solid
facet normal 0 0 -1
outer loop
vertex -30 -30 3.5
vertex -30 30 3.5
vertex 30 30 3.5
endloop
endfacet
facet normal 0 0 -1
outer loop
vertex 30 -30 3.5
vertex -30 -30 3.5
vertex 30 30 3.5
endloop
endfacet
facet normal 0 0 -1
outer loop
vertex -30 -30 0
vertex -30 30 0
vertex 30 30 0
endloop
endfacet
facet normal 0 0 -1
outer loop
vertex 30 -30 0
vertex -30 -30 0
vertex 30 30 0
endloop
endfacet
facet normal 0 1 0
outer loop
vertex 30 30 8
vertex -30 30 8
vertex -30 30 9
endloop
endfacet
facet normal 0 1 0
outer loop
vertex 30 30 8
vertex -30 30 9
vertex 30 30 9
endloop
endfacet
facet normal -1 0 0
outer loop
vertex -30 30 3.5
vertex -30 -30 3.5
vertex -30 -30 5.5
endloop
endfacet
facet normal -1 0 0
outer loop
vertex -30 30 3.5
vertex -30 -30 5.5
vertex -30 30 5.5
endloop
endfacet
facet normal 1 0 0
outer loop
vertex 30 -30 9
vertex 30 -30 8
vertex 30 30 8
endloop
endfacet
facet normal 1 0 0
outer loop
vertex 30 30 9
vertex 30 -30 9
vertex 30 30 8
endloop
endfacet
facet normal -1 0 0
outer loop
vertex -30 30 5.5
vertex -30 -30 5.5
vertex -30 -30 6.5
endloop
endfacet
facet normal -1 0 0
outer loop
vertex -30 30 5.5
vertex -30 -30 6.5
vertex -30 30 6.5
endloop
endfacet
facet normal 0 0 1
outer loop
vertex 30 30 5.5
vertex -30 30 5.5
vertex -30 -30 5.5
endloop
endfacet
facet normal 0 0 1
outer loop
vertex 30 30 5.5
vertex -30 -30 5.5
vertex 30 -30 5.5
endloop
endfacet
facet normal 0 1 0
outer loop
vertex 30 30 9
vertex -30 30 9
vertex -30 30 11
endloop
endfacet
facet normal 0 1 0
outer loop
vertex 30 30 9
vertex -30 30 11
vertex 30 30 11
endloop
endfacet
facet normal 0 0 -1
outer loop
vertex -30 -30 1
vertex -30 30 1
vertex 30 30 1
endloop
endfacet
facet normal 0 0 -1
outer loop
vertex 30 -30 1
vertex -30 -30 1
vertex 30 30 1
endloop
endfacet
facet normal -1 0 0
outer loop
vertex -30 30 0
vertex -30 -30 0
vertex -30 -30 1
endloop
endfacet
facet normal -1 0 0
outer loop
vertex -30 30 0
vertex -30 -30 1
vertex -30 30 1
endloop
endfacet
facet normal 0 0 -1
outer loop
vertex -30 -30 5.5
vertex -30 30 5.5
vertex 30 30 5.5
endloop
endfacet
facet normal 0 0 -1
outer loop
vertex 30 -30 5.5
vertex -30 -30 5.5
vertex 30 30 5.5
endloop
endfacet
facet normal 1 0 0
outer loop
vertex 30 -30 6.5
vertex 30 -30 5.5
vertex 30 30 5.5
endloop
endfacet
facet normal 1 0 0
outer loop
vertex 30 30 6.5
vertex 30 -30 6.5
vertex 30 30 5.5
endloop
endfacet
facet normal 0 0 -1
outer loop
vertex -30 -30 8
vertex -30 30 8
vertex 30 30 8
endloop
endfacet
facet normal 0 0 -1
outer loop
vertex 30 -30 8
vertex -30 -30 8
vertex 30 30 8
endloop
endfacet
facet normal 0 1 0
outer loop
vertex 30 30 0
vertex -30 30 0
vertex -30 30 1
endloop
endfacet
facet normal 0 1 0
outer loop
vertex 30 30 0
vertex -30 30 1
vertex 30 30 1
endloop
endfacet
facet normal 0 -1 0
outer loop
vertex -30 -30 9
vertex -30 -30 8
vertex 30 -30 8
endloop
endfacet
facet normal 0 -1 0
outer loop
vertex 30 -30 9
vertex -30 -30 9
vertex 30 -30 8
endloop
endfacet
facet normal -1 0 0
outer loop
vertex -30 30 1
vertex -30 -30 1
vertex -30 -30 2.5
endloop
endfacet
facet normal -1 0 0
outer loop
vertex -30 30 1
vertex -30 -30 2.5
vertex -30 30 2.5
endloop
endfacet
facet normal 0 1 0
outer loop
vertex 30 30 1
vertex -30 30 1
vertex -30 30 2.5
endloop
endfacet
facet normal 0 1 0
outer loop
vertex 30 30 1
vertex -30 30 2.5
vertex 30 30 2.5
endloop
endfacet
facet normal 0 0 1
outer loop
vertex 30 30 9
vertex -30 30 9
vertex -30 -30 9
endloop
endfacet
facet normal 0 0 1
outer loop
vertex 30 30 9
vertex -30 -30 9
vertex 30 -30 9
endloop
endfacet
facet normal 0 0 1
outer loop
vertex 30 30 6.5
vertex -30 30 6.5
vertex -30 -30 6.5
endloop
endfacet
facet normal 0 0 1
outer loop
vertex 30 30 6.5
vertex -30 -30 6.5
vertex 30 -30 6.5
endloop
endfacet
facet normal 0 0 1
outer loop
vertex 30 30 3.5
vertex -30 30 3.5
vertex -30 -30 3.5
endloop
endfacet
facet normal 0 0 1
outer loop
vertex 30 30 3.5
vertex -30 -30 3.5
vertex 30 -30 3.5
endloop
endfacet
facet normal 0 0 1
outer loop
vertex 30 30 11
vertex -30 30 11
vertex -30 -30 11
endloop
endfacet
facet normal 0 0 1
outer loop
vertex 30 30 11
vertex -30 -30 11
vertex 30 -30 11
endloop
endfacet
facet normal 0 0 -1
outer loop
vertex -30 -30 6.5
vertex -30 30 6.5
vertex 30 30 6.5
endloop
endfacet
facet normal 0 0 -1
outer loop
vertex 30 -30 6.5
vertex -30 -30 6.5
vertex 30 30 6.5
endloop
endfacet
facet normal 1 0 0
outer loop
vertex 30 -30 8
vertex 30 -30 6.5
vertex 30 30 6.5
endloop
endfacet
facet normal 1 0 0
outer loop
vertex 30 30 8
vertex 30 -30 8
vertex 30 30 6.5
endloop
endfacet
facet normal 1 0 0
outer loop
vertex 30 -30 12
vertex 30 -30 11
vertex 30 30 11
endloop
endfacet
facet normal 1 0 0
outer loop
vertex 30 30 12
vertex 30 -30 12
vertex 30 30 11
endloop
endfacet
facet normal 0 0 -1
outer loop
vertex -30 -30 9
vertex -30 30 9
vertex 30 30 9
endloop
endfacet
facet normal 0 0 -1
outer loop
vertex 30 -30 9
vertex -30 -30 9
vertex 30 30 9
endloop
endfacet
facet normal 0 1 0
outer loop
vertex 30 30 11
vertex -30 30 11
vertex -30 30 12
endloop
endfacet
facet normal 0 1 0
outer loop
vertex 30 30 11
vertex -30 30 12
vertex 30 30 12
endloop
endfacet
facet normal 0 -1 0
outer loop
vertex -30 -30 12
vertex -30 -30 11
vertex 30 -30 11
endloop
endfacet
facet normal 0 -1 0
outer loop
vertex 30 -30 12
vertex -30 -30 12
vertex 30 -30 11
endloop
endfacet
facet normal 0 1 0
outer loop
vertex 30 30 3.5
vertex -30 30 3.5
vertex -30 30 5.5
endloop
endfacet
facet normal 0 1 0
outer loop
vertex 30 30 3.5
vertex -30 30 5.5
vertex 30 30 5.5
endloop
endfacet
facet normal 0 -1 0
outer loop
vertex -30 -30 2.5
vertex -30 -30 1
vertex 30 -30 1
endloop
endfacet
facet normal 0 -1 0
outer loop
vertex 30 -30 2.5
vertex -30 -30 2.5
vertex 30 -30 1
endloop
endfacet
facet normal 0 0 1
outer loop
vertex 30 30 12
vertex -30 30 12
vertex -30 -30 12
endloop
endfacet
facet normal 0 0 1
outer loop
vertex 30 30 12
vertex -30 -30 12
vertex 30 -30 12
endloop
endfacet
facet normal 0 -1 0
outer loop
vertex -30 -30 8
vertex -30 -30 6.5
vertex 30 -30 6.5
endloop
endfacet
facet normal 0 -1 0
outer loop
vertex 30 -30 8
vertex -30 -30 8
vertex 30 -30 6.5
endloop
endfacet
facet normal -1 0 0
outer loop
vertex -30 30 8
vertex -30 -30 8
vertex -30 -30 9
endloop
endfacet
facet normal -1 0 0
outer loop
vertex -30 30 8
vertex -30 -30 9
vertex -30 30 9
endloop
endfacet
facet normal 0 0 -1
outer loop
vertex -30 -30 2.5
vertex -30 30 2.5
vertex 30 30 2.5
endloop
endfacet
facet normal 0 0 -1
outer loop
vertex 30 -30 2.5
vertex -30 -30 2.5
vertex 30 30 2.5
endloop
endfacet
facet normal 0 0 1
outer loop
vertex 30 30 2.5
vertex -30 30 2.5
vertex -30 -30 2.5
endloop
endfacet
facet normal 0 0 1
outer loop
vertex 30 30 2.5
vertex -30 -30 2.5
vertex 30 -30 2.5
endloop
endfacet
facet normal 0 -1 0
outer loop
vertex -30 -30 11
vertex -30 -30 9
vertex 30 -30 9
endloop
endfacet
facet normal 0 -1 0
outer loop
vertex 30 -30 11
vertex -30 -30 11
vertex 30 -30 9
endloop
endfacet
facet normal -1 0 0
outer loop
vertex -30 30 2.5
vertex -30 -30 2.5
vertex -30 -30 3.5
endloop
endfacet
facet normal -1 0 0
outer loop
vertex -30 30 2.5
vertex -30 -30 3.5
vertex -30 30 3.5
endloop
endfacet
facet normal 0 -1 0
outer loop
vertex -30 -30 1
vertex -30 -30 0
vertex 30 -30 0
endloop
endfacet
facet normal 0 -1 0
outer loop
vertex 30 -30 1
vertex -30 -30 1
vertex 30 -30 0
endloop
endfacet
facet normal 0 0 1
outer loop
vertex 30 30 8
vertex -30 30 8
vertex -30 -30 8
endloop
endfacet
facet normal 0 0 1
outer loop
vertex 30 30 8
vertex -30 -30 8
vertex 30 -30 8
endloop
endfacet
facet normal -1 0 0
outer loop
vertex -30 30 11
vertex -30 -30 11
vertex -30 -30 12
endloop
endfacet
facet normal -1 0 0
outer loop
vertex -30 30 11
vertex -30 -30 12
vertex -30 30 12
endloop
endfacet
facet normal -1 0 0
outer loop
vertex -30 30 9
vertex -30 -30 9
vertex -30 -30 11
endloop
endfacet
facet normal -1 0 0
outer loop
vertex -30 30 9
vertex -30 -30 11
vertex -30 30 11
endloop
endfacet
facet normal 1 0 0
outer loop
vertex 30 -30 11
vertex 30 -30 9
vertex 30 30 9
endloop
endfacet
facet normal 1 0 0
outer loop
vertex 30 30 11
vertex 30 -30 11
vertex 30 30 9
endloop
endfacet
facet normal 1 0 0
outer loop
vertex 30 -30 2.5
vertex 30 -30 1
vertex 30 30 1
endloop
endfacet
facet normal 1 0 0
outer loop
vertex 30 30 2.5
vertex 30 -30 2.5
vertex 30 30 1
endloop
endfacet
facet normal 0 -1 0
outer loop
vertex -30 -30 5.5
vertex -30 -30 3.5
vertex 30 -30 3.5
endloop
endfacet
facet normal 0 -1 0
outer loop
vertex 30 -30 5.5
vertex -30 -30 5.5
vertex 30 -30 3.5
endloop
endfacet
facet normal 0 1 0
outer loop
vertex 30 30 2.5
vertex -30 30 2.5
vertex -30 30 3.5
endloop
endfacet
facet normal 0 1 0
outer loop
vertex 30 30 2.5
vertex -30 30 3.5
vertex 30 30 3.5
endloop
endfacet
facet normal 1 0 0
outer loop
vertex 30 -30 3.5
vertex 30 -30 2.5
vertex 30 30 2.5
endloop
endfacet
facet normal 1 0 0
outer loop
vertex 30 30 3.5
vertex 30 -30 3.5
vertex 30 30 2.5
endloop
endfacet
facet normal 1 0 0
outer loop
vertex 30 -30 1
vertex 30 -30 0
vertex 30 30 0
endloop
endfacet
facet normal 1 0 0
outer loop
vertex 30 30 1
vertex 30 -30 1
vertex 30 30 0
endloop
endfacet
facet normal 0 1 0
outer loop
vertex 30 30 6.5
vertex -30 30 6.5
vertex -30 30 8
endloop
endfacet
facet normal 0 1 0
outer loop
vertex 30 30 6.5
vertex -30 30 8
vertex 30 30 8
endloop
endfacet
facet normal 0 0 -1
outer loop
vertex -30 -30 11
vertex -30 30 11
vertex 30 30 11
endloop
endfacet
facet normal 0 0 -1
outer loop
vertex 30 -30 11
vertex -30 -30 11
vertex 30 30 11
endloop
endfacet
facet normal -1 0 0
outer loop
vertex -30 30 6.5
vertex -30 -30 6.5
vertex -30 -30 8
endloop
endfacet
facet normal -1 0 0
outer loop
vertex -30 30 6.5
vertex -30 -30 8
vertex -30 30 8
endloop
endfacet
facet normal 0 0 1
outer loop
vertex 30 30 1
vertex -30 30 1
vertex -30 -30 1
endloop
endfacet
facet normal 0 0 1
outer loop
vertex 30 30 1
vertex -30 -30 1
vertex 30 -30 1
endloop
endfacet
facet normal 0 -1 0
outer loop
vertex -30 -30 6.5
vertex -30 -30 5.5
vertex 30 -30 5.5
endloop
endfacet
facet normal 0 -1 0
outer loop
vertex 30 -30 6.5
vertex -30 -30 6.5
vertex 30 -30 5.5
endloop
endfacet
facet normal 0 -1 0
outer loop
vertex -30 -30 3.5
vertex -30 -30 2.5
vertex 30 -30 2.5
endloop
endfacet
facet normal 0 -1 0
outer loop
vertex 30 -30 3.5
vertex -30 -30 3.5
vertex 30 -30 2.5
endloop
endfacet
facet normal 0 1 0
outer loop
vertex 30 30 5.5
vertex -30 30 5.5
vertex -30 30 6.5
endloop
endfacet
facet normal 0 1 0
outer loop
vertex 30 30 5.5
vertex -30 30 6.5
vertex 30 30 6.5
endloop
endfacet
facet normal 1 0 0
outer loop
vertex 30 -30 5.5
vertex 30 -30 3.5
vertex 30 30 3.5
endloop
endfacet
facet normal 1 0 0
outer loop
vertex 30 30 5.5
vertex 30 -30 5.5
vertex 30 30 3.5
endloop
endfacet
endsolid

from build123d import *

# Parameters (mm, degrees)
SKETCH_LAYEROUTLINE_W   = 60
SKETCH_LAYEROUTLINE_H   = 60
LAYER1_DEPTH            = 1
LAYER2_START            = 1
SKETCH_LAYEROUTLINE_2_W = 60
SKETCH_LAYEROUTLINE_2_H = 60
LAYER2_DEPTH            = 1.5
LAYER3_START            = 2.5
SKETCH_LAYEROUTLINE_3_W = 60
SKETCH_LAYEROUTLINE_3_H = 60
LAYER3_DEPTH            = 1
LAYER4_START            = 3.5
SKETCH_LAYEROUTLINE_4_W = 60
SKETCH_LAYEROUTLINE_4_H = 60
LAYER4_DEPTH            = 2
LAYER5_START            = 5.5
SKETCH_LAYEROUTLINE_5_W = 60
SKETCH_LAYEROUTLINE_5_H = 60
LAYER5_DEPTH            = 1
LAYER6_START            = 6.5
SKETCH_LAYEROUTLINE_6_W = 60
SKETCH_LAYEROUTLINE_6_H = 60
LAYER6_DEPTH            = 1.5
LAYER7_START            = 8
SKETCH_LAYEROUTLINE_7_W = 60
SKETCH_LAYEROUTLINE_7_H = 60
LAYER7_DEPTH            = 1
LAYER8_START            = 9
SKETCH_LAYEROUTLINE_8_W = 60
SKETCH_LAYEROUTLINE_8_H = 60
LAYER8_DEPTH            = 2
LAYER9_START            = 11
SKETCH_LAYEROUTLINE_9_W = 60
SKETCH_LAYEROUTLINE_9_H = 60
LAYER9_DEPTH            = 1


with BuildPart() as part:
    # Sketch_LayerOutline → Layer1 (new body)
    with BuildSketch(Plane.XY):
        Rectangle(SKETCH_LAYEROUTLINE_W, SKETCH_LAYEROUTLINE_H)
    extrude(amount=LAYER1_DEPTH)


with BuildPart() as body_2:
    # Sketch_LayerOutline<2> → Layer2 (new body)
    with BuildSketch(Plane.XY.offset(LAYER2_START)):
        Rectangle(SKETCH_LAYEROUTLINE_2_W, SKETCH_LAYEROUTLINE_2_H)
    extrude(amount=LAYER2_DEPTH)


with BuildPart() as body_3:
    # Sketch_LayerOutline<3> → Layer3 (new body)
    with BuildSketch(Plane.XY.offset(LAYER3_START)):
        Rectangle(SKETCH_LAYEROUTLINE_3_W, SKETCH_LAYEROUTLINE_3_H)
    extrude(amount=LAYER3_DEPTH)


with BuildPart() as body_4:
    # Sketch_LayerOutline<4> → Layer4 (new body)
    with BuildSketch(Plane.XY.offset(LAYER4_START)):
        Rectangle(SKETCH_LAYEROUTLINE_4_W, SKETCH_LAYEROUTLINE_4_H)
    extrude(amount=LAYER4_DEPTH)


with BuildPart() as body_5:
    # Sketch_LayerOutline<5> → Layer5 (new body)
    with BuildSketch(Plane.XY.offset(LAYER5_START)):
        Rectangle(SKETCH_LAYEROUTLINE_5_W, SKETCH_LAYEROUTLINE_5_H)
    extrude(amount=LAYER5_DEPTH)


with BuildPart() as body_6:
    # Sketch_LayerOutline<6> → Layer6 (new body)
    with BuildSketch(Plane.XY.offset(LAYER6_START)):
        Rectangle(SKETCH_LAYEROUTLINE_6_W, SKETCH_LAYEROUTLINE_6_H)
    extrude(amount=LAYER6_DEPTH)


with BuildPart() as body_7:
    # Sketch_LayerOutline<7> → Layer7 (new body)
    with BuildSketch(Plane.XY.offset(LAYER7_START)):
        Rectangle(SKETCH_LAYEROUTLINE_7_W, SKETCH_LAYEROUTLINE_7_H)
    extrude(amount=LAYER7_DEPTH)


with BuildPart() as body_8:
    # Sketch_LayerOutline<8> → Layer8 (new body)
    with BuildSketch(Plane.XY.offset(LAYER8_START)):
        Rectangle(SKETCH_LAYEROUTLINE_8_W, SKETCH_LAYEROUTLINE_8_H)
    extrude(amount=LAYER8_DEPTH)


with BuildPart() as body_9:
    # Sketch_LayerOutline<9> → Layer9 (new body)
    with BuildSketch(Plane.XY.offset(LAYER9_START)):
        Rectangle(SKETCH_LAYEROUTLINE_9_W, SKETCH_LAYEROUTLINE_9_H)
    extrude(amount=LAYER9_DEPTH)


solid = Compound([part.part, body_2.part, body_3.part, body_4.part, body_5.part, body_6.part, body_7.part, body_8.part, body_9.part])
